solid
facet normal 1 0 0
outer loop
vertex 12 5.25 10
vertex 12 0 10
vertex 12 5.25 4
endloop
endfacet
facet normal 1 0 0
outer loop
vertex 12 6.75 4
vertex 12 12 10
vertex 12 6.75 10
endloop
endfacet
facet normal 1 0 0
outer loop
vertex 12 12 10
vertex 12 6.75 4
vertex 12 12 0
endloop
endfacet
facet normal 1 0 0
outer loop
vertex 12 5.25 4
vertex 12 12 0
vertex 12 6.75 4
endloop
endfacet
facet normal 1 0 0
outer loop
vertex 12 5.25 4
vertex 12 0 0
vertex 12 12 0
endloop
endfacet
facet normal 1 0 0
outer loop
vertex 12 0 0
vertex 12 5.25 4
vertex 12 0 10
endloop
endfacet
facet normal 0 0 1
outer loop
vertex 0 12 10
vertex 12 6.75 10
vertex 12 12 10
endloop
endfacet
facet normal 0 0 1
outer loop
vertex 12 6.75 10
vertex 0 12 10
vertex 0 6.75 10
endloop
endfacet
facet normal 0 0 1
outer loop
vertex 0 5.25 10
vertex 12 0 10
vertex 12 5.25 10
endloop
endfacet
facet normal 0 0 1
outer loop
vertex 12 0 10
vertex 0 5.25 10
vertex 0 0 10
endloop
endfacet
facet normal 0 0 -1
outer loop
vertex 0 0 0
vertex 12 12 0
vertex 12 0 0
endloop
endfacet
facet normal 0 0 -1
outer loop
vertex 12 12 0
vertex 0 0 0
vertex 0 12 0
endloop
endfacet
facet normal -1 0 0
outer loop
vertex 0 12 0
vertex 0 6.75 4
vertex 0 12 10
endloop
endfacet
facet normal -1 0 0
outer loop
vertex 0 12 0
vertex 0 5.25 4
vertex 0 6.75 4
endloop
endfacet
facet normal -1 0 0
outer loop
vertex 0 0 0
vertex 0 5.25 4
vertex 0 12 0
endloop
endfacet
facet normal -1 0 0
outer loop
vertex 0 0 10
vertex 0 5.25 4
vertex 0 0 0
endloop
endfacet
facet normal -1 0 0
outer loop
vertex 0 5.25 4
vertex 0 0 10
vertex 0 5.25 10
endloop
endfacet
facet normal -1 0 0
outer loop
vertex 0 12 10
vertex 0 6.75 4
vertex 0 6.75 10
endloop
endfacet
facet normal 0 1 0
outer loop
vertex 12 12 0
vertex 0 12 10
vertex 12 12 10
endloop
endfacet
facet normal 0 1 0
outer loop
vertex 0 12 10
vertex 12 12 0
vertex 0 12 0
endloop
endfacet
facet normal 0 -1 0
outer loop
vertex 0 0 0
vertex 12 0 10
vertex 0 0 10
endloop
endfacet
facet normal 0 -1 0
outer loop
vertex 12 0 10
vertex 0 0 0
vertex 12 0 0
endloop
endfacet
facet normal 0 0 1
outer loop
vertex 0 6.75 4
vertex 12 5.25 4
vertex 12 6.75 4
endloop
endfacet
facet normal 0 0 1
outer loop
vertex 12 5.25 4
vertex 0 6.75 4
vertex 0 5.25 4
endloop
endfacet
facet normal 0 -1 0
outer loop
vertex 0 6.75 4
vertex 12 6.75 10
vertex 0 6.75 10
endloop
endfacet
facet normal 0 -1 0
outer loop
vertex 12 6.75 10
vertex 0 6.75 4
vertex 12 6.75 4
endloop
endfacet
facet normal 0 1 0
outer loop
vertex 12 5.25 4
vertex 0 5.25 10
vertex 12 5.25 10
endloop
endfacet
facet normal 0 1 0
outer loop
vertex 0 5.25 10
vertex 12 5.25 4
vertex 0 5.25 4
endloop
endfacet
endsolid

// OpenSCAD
$fn = 32;

// ----------------------------------------------------------------------
// Micro clip: slotted block, 5-20 mm class
// ----------------------------------------------------------------------

// --- parameters (mm) ---
block_l = 12;             // block length, X
block_w = 12;             // block width, Y
block_h = 10;             // block height, Z
slot_w = 1.5;             // slot width
slot_d = 6;               // slot depth from the top

difference() {
  cube([block_l, block_w, block_h]);
  translate([-1, block_w / 2 - slot_w / 2, block_h - slot_d])
    cube([block_l + 2, slot_w, slot_d + 1]);
}
